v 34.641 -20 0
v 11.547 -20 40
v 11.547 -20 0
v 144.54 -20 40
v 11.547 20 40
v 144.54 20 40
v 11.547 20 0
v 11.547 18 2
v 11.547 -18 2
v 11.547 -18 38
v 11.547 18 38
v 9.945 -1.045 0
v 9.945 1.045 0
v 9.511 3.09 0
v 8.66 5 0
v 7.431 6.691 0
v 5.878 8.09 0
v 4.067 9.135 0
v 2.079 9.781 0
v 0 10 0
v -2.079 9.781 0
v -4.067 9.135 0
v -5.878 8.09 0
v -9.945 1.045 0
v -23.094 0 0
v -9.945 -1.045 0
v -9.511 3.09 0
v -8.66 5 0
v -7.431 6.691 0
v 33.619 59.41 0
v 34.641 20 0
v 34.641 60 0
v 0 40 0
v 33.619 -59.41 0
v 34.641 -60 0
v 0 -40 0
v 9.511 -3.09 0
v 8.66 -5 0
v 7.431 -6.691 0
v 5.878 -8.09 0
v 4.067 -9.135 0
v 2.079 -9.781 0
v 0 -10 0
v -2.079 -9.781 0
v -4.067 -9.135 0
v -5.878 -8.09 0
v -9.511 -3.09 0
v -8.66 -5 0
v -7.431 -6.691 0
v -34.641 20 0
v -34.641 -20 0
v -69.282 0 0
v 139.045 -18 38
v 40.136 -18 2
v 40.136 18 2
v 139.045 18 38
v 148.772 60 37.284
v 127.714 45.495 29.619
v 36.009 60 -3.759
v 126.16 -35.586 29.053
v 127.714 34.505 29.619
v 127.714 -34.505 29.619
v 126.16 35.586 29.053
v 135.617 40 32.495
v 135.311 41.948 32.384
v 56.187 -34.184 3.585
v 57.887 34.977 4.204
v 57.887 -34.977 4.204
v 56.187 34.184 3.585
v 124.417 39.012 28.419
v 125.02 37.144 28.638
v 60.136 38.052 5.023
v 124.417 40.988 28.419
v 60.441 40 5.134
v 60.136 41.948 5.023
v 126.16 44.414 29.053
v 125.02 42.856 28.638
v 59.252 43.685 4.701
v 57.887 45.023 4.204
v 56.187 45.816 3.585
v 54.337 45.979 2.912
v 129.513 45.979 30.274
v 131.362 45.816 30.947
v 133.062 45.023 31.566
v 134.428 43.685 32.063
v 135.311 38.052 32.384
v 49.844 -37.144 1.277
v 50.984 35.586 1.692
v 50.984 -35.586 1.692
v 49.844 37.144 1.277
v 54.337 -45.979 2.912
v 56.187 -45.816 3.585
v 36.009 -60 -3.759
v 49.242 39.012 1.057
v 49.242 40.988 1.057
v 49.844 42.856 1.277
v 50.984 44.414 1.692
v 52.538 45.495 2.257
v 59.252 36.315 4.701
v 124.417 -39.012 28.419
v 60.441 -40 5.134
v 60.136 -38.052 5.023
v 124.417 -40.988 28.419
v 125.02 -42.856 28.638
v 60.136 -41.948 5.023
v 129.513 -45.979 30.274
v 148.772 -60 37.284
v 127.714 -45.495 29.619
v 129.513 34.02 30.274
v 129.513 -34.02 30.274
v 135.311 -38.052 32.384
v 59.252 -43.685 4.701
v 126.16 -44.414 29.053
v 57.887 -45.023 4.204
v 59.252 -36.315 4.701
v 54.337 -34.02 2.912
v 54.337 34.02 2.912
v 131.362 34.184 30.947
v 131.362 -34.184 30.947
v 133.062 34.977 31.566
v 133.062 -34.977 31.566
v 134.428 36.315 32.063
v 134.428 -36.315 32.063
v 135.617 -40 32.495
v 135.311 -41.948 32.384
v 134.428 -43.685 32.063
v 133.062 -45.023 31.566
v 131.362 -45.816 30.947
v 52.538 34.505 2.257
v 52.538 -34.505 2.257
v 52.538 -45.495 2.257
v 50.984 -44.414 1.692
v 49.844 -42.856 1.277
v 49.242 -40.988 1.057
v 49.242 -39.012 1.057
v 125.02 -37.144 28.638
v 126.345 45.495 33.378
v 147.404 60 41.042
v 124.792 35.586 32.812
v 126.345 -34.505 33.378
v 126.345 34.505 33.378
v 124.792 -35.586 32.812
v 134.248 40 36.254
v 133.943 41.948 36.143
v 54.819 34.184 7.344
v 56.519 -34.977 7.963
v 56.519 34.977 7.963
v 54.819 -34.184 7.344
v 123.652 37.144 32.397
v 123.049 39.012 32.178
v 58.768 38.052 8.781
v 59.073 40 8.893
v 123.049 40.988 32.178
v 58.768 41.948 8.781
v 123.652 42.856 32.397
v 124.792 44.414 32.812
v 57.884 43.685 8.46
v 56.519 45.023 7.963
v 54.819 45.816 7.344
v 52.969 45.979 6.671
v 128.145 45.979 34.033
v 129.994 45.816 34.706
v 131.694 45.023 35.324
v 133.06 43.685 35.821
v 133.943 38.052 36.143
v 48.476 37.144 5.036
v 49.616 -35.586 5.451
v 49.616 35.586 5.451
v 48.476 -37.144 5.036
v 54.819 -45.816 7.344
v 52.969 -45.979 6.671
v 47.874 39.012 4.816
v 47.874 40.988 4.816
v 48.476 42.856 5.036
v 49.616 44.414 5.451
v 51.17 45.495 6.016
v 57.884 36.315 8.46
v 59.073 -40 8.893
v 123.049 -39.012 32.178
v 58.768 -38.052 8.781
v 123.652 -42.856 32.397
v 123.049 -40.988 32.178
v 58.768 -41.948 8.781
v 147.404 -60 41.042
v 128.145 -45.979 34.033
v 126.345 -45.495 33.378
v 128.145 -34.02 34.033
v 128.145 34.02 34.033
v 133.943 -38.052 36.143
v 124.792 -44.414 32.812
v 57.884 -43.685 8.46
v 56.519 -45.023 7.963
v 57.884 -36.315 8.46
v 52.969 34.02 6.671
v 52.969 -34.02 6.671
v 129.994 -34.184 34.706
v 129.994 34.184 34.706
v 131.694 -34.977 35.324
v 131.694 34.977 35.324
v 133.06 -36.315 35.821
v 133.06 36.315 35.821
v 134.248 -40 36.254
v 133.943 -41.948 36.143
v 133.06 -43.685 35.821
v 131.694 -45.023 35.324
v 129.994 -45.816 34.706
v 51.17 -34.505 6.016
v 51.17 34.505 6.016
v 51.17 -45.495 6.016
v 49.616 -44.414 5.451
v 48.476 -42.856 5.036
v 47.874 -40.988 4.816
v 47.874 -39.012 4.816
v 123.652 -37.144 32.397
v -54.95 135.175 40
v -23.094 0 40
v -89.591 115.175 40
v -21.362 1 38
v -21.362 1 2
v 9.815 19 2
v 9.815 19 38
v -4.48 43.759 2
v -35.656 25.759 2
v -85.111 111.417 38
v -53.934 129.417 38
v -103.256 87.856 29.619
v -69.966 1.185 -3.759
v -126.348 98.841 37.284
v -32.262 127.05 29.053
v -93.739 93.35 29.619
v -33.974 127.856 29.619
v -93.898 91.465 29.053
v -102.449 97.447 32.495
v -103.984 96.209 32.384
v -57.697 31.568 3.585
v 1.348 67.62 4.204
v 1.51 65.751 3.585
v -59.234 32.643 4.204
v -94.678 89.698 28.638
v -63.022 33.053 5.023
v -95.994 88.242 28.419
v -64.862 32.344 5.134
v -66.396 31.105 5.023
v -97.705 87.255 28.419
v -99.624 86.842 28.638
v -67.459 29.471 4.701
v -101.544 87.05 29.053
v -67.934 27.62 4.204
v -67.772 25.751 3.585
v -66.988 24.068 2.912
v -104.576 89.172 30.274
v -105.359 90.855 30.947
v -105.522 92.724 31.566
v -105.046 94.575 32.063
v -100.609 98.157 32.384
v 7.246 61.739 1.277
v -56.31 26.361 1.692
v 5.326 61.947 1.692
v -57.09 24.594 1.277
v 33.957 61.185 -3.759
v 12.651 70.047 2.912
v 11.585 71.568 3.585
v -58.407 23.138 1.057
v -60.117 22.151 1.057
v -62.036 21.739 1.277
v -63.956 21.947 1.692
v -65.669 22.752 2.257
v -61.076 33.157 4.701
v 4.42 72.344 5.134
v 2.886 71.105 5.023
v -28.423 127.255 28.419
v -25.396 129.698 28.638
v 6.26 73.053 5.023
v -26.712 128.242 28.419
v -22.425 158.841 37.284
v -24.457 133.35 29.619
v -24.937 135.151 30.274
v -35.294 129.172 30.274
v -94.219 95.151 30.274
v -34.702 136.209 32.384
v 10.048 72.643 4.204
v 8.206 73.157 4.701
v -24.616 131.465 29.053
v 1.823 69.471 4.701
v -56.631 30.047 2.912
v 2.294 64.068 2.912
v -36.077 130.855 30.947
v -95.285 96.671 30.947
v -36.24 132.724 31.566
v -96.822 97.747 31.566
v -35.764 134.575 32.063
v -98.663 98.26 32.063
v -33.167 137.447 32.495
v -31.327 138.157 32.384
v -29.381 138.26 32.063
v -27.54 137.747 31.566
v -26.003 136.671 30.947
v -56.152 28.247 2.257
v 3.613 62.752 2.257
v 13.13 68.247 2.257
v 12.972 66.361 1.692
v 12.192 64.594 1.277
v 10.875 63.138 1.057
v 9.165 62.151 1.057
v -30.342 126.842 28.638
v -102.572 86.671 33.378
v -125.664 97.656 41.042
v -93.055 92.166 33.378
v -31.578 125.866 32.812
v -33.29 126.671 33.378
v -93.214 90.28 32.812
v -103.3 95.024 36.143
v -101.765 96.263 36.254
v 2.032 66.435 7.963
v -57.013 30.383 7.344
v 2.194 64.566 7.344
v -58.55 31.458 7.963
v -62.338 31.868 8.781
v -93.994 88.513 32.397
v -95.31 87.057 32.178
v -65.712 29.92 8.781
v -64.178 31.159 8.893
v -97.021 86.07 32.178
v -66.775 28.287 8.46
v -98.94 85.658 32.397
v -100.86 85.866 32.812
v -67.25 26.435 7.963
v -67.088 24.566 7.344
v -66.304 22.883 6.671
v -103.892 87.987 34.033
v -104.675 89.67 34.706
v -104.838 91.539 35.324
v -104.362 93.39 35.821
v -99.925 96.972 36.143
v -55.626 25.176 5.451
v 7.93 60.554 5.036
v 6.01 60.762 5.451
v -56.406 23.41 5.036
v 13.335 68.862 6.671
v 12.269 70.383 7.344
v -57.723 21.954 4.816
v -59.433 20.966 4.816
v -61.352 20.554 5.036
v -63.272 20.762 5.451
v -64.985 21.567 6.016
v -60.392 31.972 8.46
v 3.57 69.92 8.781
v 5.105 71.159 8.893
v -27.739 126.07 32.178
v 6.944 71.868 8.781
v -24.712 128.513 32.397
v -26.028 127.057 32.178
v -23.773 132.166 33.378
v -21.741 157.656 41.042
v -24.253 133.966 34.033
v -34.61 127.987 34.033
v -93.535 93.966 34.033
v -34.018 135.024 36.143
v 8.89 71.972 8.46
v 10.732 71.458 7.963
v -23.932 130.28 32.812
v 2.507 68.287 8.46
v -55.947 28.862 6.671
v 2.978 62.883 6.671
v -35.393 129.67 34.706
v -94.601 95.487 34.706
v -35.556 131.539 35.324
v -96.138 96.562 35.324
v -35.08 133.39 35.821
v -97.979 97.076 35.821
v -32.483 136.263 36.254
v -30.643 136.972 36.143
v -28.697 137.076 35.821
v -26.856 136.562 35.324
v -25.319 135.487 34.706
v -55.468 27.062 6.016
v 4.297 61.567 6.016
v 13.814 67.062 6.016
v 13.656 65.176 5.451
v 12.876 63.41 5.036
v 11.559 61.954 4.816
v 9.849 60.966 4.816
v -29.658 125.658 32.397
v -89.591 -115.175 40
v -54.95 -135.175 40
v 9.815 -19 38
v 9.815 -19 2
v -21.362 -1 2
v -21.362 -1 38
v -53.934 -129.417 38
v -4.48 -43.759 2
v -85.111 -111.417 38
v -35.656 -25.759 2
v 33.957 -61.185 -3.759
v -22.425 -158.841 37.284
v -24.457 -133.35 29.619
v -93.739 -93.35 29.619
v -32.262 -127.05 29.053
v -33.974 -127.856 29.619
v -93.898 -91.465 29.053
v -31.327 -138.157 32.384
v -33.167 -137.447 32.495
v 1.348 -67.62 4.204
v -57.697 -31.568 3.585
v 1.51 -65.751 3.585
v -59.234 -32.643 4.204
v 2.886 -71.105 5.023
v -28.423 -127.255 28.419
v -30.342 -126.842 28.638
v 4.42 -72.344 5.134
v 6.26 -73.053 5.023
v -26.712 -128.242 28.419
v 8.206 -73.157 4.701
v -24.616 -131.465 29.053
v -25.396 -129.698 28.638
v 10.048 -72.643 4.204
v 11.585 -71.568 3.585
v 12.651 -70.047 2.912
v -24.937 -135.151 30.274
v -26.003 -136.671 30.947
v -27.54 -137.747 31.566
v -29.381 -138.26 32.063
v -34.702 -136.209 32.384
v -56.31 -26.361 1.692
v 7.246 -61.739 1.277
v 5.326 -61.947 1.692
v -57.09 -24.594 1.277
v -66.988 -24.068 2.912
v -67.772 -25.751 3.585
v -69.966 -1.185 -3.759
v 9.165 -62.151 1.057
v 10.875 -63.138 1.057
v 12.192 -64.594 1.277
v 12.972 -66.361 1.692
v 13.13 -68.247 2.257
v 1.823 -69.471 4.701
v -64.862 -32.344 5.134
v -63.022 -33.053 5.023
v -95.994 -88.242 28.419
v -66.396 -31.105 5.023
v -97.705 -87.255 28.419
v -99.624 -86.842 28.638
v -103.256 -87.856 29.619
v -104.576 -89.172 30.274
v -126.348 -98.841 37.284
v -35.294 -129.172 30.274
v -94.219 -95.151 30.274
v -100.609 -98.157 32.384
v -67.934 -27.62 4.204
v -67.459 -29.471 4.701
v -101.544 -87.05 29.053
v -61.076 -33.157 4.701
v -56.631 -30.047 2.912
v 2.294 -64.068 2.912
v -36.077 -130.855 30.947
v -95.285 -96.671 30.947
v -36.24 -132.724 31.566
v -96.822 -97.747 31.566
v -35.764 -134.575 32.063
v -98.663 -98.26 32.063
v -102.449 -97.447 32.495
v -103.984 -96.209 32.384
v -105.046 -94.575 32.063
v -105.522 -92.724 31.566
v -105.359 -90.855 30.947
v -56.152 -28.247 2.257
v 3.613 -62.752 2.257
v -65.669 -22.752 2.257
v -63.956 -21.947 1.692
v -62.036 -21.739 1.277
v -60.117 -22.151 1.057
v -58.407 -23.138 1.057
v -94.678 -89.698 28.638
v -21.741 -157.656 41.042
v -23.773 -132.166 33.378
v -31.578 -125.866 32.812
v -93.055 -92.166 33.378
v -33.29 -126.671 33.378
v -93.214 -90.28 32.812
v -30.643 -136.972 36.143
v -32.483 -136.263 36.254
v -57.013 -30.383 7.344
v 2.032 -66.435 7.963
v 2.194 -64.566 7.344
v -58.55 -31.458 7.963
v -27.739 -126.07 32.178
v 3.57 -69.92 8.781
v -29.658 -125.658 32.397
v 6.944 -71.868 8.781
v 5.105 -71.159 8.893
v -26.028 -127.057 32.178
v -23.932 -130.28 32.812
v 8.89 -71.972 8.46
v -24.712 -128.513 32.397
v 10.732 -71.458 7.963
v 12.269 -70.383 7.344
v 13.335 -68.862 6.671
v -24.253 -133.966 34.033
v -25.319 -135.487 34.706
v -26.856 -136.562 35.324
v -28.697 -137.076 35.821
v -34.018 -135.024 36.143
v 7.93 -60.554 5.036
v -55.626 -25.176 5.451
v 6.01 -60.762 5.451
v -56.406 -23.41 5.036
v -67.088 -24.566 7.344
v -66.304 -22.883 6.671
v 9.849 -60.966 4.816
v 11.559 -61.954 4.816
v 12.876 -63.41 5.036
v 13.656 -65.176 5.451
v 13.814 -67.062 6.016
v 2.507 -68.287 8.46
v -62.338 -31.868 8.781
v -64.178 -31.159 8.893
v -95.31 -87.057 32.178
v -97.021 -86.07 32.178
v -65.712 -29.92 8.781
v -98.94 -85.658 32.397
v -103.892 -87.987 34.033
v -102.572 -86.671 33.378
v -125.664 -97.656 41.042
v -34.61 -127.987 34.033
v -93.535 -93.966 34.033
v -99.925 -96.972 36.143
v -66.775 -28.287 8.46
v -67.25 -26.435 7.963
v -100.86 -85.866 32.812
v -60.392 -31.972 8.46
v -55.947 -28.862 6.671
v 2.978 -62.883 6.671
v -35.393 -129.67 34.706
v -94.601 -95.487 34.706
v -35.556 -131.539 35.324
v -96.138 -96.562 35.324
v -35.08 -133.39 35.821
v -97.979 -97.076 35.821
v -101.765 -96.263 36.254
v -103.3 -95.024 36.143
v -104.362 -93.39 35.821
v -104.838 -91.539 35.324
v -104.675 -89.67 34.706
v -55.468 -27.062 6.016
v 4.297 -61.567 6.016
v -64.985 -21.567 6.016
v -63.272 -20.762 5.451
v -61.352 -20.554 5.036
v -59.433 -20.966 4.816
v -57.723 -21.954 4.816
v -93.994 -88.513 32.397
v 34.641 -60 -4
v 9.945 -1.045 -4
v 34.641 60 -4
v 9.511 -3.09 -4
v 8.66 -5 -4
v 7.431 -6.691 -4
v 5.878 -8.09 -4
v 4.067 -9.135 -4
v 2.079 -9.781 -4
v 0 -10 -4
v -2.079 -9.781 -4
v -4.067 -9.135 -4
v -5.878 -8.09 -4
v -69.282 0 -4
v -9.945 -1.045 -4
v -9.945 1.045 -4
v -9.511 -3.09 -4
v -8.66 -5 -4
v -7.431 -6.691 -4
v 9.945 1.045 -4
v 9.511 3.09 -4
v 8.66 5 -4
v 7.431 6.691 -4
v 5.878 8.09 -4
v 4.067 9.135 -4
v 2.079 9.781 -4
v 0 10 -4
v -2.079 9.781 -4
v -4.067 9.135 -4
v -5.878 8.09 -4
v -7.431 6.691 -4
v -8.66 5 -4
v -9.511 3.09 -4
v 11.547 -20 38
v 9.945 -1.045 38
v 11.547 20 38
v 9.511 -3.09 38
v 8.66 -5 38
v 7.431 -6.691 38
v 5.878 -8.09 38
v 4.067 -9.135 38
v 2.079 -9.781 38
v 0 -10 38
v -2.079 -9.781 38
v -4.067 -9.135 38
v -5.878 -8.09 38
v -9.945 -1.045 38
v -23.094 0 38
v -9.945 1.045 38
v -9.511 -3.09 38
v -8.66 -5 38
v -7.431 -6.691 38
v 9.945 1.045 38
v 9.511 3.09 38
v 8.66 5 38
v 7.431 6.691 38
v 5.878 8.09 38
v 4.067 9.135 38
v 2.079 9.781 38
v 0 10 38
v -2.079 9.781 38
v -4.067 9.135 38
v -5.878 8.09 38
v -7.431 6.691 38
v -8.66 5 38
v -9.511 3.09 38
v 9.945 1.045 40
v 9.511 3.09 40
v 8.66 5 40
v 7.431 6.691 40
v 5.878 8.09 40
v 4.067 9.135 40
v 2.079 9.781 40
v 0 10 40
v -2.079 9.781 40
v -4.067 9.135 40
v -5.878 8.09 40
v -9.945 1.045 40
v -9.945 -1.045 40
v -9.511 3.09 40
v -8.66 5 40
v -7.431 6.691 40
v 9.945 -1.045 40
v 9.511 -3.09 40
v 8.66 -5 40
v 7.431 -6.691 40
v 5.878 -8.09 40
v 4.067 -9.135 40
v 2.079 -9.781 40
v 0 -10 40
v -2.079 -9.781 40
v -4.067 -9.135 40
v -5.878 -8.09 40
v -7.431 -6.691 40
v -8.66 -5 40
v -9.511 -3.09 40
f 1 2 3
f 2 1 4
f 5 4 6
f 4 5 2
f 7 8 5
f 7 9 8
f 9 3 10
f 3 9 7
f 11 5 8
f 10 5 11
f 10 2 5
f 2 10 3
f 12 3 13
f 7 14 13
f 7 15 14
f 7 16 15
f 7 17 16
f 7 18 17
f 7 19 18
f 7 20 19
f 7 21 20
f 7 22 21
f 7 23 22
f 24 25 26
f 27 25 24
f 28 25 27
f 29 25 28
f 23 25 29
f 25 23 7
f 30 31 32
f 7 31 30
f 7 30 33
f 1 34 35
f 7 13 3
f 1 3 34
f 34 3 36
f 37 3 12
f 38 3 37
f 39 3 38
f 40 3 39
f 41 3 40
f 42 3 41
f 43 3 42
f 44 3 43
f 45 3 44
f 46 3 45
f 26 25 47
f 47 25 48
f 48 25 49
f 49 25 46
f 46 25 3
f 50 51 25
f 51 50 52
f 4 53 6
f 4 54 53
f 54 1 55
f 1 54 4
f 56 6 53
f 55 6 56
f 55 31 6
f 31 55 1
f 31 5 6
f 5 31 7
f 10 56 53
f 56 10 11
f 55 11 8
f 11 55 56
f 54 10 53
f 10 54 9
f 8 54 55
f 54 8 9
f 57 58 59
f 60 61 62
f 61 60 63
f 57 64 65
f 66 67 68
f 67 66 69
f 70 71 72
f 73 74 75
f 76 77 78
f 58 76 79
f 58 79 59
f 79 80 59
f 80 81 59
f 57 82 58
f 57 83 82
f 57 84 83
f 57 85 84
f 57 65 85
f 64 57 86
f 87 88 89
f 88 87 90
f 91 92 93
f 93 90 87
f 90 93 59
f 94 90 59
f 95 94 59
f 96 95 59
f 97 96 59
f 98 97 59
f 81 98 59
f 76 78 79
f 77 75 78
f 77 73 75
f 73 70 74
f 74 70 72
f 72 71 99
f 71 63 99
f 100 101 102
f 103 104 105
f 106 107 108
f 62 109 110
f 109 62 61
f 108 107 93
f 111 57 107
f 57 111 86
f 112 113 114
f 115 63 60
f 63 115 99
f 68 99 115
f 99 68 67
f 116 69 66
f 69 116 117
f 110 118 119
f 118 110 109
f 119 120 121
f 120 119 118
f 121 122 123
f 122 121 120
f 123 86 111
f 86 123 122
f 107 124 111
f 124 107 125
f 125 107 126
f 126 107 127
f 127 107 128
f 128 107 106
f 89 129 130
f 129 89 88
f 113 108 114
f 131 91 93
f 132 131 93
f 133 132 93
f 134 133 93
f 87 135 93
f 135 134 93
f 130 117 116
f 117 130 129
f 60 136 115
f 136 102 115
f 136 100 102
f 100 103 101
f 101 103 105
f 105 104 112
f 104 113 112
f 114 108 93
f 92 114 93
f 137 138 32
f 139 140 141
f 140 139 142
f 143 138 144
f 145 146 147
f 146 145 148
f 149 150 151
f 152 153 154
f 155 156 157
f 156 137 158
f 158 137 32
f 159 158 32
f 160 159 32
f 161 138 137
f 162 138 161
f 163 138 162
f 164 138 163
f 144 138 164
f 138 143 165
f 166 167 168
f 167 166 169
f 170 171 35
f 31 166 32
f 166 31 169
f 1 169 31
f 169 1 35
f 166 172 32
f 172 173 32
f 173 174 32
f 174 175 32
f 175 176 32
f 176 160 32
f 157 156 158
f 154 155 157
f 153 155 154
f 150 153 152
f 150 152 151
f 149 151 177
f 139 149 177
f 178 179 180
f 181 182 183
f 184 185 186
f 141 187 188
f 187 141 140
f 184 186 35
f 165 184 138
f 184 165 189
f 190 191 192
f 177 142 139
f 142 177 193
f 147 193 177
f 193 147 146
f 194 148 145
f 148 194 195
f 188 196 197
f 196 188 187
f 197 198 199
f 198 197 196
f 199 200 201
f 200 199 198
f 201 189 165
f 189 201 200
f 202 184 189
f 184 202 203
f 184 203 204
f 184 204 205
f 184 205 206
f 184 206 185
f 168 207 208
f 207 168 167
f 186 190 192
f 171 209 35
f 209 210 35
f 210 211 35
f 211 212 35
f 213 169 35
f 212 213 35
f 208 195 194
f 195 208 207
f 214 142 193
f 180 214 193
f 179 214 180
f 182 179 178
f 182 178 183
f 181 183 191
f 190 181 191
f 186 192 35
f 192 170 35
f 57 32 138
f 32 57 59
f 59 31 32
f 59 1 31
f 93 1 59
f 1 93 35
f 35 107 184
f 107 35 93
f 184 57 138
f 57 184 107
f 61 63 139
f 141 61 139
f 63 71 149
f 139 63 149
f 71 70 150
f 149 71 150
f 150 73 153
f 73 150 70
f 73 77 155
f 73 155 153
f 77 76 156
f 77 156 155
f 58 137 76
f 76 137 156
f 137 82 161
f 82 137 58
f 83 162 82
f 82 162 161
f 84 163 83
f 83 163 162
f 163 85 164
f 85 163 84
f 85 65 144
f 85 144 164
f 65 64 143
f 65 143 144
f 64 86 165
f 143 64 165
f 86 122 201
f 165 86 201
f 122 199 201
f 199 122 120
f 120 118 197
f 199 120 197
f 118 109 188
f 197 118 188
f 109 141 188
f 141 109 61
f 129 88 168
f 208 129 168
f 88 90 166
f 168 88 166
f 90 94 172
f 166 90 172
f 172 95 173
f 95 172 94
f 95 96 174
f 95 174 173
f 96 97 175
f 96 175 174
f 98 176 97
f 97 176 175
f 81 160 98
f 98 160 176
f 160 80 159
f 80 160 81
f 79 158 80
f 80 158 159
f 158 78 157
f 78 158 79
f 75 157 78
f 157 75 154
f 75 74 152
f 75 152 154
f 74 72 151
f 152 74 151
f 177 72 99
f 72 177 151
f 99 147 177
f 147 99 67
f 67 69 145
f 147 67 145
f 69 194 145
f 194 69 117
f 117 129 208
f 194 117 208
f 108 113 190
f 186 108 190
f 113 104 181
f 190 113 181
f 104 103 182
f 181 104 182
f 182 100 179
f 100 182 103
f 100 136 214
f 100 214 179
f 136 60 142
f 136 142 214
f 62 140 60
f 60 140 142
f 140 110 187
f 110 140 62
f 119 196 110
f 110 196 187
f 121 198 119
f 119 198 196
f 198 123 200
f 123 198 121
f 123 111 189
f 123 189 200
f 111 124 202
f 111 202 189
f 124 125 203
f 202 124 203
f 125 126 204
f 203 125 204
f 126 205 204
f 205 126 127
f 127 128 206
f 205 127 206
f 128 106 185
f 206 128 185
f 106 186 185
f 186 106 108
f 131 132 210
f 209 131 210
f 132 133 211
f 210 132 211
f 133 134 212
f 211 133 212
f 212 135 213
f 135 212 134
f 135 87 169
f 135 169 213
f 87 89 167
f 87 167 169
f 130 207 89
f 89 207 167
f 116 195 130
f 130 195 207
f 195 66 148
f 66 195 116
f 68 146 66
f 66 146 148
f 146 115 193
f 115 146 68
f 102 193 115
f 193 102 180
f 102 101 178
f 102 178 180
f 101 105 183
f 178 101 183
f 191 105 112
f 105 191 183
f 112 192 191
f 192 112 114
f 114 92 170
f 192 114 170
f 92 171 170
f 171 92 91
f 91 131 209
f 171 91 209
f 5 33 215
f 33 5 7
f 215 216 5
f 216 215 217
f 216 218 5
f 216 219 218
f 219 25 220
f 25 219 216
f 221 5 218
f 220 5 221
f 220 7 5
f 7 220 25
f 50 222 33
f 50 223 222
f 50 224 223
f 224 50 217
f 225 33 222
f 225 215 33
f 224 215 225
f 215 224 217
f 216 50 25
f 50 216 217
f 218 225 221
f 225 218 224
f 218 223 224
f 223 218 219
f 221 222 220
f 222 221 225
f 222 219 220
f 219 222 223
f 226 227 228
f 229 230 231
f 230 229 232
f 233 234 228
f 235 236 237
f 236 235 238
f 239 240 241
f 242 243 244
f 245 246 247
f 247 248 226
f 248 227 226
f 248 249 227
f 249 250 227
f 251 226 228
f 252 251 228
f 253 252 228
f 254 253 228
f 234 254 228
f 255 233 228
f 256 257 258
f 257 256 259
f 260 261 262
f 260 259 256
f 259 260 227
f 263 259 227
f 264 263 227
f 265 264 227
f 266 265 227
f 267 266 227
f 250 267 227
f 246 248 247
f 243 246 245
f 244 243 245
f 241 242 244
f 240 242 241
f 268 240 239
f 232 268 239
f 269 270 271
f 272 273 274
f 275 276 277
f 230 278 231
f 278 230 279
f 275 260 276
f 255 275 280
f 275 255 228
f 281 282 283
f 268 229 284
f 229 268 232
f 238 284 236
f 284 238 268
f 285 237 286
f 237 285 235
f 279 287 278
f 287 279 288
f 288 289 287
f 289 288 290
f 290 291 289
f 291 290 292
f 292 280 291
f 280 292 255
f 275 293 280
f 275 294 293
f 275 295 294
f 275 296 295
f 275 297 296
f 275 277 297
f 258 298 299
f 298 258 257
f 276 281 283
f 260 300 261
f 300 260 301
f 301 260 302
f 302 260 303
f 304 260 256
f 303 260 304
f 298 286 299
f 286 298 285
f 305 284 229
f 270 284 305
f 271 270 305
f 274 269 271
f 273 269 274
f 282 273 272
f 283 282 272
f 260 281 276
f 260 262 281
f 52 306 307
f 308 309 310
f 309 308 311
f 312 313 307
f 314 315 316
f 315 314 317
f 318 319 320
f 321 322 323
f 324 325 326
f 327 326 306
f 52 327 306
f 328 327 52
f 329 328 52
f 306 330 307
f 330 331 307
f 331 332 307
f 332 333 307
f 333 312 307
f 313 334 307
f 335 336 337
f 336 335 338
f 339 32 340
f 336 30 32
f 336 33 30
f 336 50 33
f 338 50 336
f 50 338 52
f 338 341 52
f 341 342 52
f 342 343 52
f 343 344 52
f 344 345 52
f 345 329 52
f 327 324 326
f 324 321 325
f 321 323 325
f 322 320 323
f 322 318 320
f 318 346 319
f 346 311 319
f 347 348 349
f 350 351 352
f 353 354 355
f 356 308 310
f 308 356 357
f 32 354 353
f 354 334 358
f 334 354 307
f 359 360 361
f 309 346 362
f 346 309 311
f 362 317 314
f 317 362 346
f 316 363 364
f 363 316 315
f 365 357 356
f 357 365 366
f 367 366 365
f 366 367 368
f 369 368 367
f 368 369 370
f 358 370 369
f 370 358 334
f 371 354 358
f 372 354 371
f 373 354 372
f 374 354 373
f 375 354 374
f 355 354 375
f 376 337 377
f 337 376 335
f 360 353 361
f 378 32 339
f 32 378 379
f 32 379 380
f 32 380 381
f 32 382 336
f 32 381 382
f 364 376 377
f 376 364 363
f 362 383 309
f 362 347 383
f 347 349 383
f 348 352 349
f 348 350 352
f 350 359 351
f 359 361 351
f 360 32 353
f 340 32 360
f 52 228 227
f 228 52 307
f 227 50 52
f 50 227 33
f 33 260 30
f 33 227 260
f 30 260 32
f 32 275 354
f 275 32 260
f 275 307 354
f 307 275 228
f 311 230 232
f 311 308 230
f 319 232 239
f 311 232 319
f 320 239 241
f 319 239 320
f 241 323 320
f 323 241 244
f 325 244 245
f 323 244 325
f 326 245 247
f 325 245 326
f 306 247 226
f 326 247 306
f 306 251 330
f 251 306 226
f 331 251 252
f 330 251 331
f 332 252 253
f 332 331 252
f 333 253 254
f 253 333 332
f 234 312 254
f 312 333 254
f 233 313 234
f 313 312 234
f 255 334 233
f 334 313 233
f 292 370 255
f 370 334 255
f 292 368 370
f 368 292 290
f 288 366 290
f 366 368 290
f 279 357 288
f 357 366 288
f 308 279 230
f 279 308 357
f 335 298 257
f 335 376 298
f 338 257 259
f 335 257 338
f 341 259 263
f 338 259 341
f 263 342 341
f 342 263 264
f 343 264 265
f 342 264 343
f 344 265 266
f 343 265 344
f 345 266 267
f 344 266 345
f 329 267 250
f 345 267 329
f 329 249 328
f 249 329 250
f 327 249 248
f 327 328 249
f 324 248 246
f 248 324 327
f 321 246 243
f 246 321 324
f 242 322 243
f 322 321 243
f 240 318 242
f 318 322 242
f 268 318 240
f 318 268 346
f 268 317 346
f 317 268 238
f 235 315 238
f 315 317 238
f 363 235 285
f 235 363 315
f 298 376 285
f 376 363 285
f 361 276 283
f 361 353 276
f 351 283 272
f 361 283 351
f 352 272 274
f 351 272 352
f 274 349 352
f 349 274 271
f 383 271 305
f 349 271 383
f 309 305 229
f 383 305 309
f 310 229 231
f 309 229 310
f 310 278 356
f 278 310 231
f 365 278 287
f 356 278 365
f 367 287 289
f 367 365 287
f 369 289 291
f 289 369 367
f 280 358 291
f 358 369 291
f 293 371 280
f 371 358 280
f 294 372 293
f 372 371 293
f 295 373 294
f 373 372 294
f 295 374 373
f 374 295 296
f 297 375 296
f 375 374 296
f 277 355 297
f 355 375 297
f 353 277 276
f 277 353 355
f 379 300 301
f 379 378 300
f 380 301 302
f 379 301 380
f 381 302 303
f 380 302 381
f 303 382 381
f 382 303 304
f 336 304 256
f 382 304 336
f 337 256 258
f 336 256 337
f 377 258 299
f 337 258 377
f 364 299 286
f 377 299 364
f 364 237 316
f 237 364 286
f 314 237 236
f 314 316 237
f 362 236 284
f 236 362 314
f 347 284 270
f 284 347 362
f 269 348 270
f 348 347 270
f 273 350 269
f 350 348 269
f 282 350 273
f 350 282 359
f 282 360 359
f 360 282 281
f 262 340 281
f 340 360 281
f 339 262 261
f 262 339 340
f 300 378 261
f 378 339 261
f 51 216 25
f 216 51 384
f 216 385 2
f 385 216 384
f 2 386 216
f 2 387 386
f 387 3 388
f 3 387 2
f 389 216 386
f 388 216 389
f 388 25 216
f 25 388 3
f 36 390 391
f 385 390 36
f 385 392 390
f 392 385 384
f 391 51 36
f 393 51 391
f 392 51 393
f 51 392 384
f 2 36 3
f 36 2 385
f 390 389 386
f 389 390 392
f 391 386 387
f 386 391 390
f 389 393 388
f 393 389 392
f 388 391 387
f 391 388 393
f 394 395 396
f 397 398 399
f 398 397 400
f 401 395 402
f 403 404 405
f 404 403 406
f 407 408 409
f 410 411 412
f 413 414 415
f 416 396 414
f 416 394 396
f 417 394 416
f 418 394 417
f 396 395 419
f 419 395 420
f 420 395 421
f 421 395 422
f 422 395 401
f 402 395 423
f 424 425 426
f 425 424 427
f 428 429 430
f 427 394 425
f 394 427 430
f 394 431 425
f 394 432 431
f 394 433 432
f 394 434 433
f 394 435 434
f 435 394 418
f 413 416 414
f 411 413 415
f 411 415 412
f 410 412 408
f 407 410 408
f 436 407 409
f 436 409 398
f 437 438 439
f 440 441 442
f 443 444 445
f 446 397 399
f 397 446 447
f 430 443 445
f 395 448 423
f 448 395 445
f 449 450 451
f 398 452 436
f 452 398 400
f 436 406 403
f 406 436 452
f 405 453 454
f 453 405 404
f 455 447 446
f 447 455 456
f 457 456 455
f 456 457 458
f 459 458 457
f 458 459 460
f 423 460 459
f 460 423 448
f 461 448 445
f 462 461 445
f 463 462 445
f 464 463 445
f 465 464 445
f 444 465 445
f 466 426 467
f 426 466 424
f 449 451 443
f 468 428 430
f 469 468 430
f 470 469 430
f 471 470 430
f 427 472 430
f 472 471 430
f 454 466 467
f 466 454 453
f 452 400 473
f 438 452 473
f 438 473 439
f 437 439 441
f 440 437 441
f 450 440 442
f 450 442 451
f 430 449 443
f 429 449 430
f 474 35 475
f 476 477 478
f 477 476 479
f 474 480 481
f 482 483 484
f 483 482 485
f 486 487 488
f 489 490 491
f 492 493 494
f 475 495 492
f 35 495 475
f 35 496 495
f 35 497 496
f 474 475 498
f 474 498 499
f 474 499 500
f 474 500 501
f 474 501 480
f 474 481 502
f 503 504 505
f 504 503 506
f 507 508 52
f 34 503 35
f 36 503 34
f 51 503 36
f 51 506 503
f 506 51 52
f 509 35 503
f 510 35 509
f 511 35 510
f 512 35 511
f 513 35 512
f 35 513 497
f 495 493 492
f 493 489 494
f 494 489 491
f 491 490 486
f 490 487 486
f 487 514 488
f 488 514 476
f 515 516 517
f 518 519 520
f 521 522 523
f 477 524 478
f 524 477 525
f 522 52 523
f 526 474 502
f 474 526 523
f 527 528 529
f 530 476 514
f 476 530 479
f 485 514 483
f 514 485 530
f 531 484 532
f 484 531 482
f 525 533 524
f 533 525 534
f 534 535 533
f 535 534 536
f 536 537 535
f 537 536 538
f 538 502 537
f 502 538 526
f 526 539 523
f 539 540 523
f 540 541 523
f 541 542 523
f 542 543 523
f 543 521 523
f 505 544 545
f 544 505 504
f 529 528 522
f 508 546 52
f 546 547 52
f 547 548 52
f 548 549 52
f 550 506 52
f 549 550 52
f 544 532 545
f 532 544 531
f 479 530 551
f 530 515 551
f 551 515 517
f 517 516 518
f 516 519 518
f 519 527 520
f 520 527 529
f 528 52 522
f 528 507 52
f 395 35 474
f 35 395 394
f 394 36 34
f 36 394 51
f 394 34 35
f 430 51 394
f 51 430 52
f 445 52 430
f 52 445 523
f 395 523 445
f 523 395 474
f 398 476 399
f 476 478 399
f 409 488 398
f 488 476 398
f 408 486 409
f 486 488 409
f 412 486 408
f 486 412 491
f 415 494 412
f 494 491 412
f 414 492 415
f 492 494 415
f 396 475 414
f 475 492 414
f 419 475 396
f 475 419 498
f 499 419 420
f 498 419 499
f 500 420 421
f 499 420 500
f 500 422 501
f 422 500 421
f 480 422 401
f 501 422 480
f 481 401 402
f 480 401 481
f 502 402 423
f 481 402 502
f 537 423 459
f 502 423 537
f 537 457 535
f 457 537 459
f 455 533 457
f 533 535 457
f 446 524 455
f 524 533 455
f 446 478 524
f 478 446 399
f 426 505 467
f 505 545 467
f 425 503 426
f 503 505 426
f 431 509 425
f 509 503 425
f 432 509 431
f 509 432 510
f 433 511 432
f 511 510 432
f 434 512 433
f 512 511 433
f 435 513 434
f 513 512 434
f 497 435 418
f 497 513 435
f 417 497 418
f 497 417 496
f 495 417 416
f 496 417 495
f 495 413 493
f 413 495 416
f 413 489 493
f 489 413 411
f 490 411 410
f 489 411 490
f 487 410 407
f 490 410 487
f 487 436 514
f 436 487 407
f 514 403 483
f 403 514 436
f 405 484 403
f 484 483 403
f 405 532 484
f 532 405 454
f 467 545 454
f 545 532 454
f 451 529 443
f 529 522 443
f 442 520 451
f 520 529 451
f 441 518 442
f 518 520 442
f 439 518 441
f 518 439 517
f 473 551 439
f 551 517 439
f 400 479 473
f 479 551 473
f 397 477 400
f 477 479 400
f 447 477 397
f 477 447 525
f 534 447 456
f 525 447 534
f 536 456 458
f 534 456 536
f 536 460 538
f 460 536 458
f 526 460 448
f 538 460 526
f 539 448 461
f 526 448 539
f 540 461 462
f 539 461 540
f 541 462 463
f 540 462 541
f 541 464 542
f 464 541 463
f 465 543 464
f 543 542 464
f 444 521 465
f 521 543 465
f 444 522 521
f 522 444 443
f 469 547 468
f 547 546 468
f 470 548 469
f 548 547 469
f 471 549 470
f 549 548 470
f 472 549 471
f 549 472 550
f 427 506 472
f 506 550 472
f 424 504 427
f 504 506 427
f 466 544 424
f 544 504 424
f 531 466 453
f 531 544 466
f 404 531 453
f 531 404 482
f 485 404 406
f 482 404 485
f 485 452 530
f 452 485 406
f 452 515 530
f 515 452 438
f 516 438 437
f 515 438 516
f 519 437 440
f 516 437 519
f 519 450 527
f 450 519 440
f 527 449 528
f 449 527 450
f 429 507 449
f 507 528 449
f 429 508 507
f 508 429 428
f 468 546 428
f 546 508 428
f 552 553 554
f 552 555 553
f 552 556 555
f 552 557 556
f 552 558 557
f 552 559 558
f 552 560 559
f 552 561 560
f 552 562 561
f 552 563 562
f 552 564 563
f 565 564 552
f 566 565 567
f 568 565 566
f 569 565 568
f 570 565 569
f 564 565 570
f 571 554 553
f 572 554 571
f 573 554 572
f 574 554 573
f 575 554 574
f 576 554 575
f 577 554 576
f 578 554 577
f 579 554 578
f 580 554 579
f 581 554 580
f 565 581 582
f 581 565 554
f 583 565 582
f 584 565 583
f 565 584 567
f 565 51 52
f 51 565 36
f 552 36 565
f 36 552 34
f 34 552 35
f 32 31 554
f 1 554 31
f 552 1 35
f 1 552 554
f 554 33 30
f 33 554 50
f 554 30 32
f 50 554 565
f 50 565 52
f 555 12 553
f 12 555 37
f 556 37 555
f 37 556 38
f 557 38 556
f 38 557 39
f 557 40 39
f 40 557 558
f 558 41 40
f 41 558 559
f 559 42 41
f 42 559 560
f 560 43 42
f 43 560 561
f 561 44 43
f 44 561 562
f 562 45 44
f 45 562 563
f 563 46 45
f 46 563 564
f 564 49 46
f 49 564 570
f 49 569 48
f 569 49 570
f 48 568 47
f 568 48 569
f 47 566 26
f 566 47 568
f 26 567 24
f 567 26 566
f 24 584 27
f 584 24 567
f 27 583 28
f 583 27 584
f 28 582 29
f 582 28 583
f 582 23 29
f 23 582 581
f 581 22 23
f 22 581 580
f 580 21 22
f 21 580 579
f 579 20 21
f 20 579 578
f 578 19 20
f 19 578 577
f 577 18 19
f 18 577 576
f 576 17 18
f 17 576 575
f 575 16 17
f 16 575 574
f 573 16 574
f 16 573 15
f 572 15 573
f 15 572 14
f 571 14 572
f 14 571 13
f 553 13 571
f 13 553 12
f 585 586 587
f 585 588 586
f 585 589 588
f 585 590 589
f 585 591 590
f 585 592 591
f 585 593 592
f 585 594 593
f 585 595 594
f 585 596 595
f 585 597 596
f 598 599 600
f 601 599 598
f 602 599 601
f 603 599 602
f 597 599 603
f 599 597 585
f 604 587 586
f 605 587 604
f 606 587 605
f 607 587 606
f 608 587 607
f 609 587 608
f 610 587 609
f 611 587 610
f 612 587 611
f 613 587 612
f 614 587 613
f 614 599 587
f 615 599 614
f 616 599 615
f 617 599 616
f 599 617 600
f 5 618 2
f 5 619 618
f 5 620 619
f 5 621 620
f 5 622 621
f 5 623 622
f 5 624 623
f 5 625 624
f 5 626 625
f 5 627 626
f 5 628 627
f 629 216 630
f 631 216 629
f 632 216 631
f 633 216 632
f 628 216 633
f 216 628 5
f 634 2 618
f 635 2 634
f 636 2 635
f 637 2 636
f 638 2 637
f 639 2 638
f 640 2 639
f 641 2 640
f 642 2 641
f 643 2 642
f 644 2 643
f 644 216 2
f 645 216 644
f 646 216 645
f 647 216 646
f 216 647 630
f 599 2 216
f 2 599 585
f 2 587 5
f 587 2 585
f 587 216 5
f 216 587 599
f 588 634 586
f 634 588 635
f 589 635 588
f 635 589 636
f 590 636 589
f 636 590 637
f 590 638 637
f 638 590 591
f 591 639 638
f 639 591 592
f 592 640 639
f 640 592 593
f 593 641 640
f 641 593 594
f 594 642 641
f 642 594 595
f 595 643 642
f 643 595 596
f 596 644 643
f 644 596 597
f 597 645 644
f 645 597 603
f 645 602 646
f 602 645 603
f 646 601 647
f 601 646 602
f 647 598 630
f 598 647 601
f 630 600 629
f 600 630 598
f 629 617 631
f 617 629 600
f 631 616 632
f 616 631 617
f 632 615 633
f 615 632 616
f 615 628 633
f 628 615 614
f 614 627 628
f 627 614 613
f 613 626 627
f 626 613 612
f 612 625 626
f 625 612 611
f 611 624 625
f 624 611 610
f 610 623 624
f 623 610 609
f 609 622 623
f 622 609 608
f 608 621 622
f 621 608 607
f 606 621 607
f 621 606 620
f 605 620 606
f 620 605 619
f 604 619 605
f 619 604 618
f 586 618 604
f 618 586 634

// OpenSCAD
module prop(width=120, holes_dist=80, hole_diam=12, thickness=4)
{
    color(c="DarkSlateGray")
    linear_extrude(height=thickness) {
        difference() {
            polygon(points=[[-width/2, -width/2],
                            [ width/2, -width/2],
                            [ width/2,  width/2],
                            [-width/2,  width/2]]);
            translate([ holes_dist/2,  holes_dist/2]) circle(d=12);
            translate([ holes_dist/2, -holes_dist/2]) circle(d=12);
            translate([-holes_dist/2,  holes_dist/2]) circle(d=12);
            translate([-holes_dist/2, -holes_dist/2]) circle(d=12);
        }
    }
}

module tube(width=40, plate_width=120, plate_angle=20, thickness=2)
{
    hyp = width / sin(20);
    adj = hyp * cos(20);
    toff = (plate_width/2 - width/2) * tan(30);

    echo("Tube length: ", toff + adj);
    echo("Tube offset after cut at ", plate_angle, "° : ", toff);

    color("cyan")
    rotate([0, 0, -90]) {
        translate([width/2, 0, 0])
            rotate([0, -90, 0]) {
            difference() {
                linear_extrude(width) {
                    polygon([[width, -toff],
                             [width, adj],
                             [0, 0],
                             [0, -toff]
                             ]);
                }
                translate([thickness, -1-toff, thickness]) cube([width-2*thickness, adj+toff+2, width-2*thickness]);
            }
        }
    }
}

module triangle(width, thickness, hole_diam=20)
{
    height = width * cos(30);
    center = height - width / sqrt(3);

    echo("Triangle width: ", width, ", height: ", height, ", center: ", center);

    color(c="gray", alpha=0.8) {
        rotate([0, 0, 90]) {
            translate([-width/2, -center, -thickness]) {
                linear_extrude(thickness) {
                    difference() {
                        polygon([[0, 0], [width/2, height], [width, 0]]);
                        translate([width/2, center]) circle(d=hole_diam);
                    }
                }
            }
        }
    }
}


plate_width = 120;
plate_angle = 20;
plate_thickness = 4;
tube_width = 40;

triangle_plate_width = plate_width/sqrt(3);
prop_dist = triangle_plate_width/2;


triangle(plate_width, 4);
translate([0, 0, tube_width]) triangle(tube_width, 2);

rotate([0, 0, 0])  {
    translate([triangle_plate_width/2, 0, 0]) {
        rotate([0, -plate_angle, 0]) {
            translate([plate_width/2, 0, -plate_thickness]) {
                prop(plate_width, thickness=plate_thickness);
            }
        }
        tube(tube_width, plate_width, plate_angle);
    }
}

rotate([0, 0, 120])  {
    translate([triangle_plate_width/2, 0, 0]) {
        rotate([0, -plate_angle, 0]) {
            translate([plate_width/2, 0, -plate_thickness]) {
                prop(plate_width, thickness=plate_thickness);
            }
        }
        tube(tube_width, plate_width, plate_angle);
    }
}

rotate([0, 0, 240])  {
    translate([triangle_plate_width/2, 0, 0]) {
        rotate([0, -plate_angle, 0]) {
            translate([plate_width/2, 0, -plate_thickness]) {
                prop(plate_width, thickness=plate_thickness);
            }
        }
        tube(tube_width, plate_width, plate_angle);
    }
}
